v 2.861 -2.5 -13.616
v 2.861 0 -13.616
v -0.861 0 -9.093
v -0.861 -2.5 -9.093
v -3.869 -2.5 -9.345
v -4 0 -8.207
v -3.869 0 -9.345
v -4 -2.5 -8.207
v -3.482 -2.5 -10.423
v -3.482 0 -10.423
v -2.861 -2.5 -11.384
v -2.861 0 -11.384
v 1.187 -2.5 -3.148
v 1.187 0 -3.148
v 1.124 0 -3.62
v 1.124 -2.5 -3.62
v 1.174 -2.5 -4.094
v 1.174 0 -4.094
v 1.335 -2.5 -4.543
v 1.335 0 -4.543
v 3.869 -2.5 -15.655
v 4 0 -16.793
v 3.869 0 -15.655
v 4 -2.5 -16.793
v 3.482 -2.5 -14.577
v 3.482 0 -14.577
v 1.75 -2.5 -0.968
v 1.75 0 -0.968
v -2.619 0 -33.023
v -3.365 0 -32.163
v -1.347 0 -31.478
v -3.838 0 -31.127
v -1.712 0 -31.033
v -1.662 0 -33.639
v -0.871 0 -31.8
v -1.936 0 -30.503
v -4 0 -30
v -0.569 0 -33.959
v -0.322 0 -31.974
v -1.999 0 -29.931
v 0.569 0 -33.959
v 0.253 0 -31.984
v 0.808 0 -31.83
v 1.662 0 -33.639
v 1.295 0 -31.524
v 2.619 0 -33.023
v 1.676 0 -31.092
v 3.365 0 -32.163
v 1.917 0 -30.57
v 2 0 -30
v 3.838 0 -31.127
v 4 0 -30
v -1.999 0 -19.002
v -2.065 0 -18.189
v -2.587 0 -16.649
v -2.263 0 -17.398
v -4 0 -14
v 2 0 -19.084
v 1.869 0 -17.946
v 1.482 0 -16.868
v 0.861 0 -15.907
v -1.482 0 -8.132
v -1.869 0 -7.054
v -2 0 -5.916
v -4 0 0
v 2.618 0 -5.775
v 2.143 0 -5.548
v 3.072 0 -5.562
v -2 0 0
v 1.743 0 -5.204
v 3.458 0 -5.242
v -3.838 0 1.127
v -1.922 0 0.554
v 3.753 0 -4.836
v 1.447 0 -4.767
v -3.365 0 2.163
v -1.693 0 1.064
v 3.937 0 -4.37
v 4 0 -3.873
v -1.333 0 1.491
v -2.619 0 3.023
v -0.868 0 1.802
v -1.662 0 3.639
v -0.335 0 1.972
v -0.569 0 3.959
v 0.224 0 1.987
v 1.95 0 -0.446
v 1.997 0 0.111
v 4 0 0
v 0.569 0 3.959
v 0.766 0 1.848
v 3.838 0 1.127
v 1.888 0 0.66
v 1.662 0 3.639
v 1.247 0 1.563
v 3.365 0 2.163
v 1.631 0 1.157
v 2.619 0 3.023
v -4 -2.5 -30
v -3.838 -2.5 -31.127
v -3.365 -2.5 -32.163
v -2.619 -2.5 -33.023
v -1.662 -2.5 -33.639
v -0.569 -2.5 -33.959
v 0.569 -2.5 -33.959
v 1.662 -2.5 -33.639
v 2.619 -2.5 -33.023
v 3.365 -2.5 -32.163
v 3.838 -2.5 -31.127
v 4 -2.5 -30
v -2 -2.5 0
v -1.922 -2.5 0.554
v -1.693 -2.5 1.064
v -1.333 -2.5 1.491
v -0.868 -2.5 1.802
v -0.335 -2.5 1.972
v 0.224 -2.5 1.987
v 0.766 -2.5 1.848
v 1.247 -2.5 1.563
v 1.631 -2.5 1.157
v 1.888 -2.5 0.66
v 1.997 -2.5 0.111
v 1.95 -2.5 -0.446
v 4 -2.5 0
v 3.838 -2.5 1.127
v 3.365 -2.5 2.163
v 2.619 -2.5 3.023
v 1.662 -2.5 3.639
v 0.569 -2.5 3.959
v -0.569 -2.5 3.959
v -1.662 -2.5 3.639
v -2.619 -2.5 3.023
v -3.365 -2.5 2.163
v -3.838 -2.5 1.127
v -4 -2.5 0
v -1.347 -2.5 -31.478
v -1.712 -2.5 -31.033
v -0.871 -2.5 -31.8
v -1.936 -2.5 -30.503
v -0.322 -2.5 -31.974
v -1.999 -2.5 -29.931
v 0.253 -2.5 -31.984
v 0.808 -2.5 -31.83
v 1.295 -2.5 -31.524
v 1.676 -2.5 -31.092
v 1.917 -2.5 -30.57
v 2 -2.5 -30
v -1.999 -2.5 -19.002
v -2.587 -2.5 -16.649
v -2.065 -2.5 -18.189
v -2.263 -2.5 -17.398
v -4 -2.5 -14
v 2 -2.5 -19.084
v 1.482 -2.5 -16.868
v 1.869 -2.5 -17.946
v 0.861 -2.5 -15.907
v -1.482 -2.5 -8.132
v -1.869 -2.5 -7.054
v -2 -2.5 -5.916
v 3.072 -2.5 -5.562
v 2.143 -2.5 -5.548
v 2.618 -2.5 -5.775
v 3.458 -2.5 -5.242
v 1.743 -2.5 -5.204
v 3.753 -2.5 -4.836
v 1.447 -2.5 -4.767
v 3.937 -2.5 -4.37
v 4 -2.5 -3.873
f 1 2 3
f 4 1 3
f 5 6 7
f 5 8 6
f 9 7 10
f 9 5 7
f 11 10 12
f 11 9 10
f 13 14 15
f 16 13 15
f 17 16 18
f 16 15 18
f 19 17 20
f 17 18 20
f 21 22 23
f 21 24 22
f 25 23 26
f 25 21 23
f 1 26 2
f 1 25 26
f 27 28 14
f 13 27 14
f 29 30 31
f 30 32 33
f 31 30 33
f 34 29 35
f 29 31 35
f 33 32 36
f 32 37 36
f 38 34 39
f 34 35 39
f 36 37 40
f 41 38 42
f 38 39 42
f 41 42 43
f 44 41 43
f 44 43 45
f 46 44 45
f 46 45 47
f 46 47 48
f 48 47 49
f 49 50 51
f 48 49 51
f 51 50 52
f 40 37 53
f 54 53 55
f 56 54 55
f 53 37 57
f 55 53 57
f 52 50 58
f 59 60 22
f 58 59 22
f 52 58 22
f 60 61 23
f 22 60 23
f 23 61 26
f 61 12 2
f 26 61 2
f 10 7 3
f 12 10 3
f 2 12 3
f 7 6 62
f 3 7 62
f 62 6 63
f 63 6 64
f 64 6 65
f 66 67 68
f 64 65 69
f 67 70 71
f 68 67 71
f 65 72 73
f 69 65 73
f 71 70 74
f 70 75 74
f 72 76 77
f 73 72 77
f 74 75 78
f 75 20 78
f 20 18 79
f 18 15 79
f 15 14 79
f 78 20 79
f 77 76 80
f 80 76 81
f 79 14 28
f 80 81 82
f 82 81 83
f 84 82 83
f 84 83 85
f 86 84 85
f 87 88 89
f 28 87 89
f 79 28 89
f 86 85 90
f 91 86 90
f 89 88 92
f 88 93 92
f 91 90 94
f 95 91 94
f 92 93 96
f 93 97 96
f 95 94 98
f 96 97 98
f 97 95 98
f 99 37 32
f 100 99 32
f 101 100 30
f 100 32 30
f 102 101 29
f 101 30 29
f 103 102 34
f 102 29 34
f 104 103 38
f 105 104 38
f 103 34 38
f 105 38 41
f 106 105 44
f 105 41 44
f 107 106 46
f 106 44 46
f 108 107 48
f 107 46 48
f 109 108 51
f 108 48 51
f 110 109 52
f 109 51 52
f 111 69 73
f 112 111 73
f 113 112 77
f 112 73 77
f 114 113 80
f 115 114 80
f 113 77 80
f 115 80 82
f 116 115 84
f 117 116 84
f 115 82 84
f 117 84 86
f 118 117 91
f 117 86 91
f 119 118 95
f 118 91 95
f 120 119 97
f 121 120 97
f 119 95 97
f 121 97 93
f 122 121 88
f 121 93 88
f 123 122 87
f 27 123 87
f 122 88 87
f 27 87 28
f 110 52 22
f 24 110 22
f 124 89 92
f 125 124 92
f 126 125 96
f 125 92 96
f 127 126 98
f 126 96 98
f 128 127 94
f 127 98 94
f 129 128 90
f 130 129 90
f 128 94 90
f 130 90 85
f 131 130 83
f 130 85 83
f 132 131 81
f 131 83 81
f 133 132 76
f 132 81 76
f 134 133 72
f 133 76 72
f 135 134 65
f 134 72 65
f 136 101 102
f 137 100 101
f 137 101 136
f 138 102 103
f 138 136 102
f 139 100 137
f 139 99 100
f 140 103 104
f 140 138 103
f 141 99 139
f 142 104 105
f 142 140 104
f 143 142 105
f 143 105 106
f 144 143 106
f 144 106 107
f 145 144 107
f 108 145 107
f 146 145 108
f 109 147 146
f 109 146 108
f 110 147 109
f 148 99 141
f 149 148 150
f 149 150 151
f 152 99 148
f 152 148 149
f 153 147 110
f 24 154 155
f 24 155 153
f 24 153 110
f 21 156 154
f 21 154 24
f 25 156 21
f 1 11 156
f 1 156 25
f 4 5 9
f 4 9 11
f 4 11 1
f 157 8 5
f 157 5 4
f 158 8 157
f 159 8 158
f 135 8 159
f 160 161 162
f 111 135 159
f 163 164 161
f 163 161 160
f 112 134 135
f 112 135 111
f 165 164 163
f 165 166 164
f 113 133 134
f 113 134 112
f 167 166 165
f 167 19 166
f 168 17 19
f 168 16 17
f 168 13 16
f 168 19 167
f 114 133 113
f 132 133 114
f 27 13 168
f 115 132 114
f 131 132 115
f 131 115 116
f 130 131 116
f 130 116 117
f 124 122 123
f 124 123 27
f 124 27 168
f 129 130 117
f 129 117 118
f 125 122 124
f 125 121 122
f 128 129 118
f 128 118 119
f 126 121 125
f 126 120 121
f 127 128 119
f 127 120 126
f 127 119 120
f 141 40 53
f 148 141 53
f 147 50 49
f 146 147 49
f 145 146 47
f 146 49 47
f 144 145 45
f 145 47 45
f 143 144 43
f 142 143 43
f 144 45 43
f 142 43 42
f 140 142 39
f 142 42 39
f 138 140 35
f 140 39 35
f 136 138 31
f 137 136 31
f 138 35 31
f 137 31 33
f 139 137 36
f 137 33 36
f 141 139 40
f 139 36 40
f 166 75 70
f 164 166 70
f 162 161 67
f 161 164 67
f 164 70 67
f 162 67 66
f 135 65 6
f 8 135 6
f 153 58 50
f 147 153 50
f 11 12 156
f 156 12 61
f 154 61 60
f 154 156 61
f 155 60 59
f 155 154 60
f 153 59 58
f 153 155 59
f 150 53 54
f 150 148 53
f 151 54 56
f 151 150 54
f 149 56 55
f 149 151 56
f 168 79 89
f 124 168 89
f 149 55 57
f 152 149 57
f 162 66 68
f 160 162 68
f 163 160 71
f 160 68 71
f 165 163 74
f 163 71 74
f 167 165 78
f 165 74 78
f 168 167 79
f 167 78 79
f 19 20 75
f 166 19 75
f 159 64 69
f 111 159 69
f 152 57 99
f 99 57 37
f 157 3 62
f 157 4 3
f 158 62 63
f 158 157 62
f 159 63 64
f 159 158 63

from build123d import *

# Parameters (mm, degrees)
F1_DEPTH    = 2.5
F2_R        = 5
F3_T1_DEPTH = 6.2430809658
F3_T3_DEPTH = 8.6803398875
F3_T5_DEPTH = 12.5


# Not quite as in the source:
# - a fillet or chamfer that OpenCascade refuses, or shapes differently, is made with other operations: its cross-section is extruded or revolved along the edge and cut away or added


with BuildPart() as f1:
    # F0 (on Front) → F1 (new body)
    with BuildSketch(Plane.XZ):
        with BuildLine():
            ThreePointArc((-2, 0), (0.5, 1.9364916731), (1.75, -0.9682458366))
            Line((1.75, -0.9682458366), (1, -3.8729833462))
            Line((1, -3.8729833462), (2, -5.8729833462))
            Line((2, -5.8729833462), (4, -5.8729833462))
            Line((4, -5.8729833462), (4, 0))
            ThreePointArc((4, 0), (0, 4), (-4, 0))
            Line((-4, 0), (-4, -10))
            Line((-4, -10), (2, -17.2908526251))
            Line((2, -17.2908526251), (2, -30))
            ThreePointArc((2, -30), (-0.0346553957, -31.9996997283), (-1.9987990036, -29.9306996147))
            Line((-1.9987990036, -29.9306996147), (-1.9987990036, -17.7522518683))
            Line((-1.9987990036, -17.7522518683), (-4, -14))
            Line((-4, -14), (-4, -30))
            ThreePointArc((-4, -30), (0, -34), (4, -30))
            Line((4, -30), (4, -15))
            Line((4, -15), (-2, -7.7091473749))
            Line((-2, -7.7091473749), (-2, 0))
        make_face()
    extrude(amount=F1_DEPTH)

    # F2
    f2_edges = [f1.edges().sort_by_distance(p)[0] for p in [
        (-4, -1.25, -10),
        (2, -1.25, -17.290853),
        (4, -1.25, -15),
        (-2, -1.25, -7.709147),
        (-1.998799, -1.25, -17.752252),
    ]]
    fillet(f2_edges, radius=F2_R)

    # F3: fillet of radius 2 on 3 edges, made by hand

    # F3_s2 → F3_t1 (cut)
    with BuildSketch(Plane.XZ.offset(-1.8715404829)):
        with BuildLine():
            ThreePointArc((1.1871540483, -3.148138834), (1.1347622142, -3.8587151733), (1.3347913394, -4.542566025))
            Line((1.3347913394, -4.542566025), (1, -3.8729833462))
            Line((1, -3.8729833462), (1.1871540483, -3.148138834))
        make_face()
    extrude(amount=F3_T1_DEPTH, mode=Mode.SUBTRACT)

    # F3_s4 → F3_t3 (cut)
    with BuildSketch(Plane.XZ.offset(-3.0901699437)):
        with BuildLine():
            ThreePointArc((1.4472135955, -4.7674105372), (2.1846057533, -5.5742849629), (3.2360679775, -5.8729833462))
            Line((3.2360679775, -5.8729833462), (2, -5.8729833462))
            Line((2, -5.8729833462), (1.4472135955, -4.7674105372))
        make_face()
    extrude(amount=F3_T3_DEPTH, mode=Mode.SUBTRACT)

    # F3_s6 → F3_t5 (cut)
    with BuildSketch(Plane.XZ.offset(-5)):
        with BuildLine():
            ThreePointArc((2, -5.8729833462), (3.4142135624, -5.2871969086), (4, -3.8729833462))
            Line((4, -3.8729833462), (4, -5.8729833462))
            Line((4, -5.8729833462), (2, -5.8729833462))
        make_face()
    extrude(amount=F3_T5_DEPTH, mode=Mode.SUBTRACT)


solid = f1.part
